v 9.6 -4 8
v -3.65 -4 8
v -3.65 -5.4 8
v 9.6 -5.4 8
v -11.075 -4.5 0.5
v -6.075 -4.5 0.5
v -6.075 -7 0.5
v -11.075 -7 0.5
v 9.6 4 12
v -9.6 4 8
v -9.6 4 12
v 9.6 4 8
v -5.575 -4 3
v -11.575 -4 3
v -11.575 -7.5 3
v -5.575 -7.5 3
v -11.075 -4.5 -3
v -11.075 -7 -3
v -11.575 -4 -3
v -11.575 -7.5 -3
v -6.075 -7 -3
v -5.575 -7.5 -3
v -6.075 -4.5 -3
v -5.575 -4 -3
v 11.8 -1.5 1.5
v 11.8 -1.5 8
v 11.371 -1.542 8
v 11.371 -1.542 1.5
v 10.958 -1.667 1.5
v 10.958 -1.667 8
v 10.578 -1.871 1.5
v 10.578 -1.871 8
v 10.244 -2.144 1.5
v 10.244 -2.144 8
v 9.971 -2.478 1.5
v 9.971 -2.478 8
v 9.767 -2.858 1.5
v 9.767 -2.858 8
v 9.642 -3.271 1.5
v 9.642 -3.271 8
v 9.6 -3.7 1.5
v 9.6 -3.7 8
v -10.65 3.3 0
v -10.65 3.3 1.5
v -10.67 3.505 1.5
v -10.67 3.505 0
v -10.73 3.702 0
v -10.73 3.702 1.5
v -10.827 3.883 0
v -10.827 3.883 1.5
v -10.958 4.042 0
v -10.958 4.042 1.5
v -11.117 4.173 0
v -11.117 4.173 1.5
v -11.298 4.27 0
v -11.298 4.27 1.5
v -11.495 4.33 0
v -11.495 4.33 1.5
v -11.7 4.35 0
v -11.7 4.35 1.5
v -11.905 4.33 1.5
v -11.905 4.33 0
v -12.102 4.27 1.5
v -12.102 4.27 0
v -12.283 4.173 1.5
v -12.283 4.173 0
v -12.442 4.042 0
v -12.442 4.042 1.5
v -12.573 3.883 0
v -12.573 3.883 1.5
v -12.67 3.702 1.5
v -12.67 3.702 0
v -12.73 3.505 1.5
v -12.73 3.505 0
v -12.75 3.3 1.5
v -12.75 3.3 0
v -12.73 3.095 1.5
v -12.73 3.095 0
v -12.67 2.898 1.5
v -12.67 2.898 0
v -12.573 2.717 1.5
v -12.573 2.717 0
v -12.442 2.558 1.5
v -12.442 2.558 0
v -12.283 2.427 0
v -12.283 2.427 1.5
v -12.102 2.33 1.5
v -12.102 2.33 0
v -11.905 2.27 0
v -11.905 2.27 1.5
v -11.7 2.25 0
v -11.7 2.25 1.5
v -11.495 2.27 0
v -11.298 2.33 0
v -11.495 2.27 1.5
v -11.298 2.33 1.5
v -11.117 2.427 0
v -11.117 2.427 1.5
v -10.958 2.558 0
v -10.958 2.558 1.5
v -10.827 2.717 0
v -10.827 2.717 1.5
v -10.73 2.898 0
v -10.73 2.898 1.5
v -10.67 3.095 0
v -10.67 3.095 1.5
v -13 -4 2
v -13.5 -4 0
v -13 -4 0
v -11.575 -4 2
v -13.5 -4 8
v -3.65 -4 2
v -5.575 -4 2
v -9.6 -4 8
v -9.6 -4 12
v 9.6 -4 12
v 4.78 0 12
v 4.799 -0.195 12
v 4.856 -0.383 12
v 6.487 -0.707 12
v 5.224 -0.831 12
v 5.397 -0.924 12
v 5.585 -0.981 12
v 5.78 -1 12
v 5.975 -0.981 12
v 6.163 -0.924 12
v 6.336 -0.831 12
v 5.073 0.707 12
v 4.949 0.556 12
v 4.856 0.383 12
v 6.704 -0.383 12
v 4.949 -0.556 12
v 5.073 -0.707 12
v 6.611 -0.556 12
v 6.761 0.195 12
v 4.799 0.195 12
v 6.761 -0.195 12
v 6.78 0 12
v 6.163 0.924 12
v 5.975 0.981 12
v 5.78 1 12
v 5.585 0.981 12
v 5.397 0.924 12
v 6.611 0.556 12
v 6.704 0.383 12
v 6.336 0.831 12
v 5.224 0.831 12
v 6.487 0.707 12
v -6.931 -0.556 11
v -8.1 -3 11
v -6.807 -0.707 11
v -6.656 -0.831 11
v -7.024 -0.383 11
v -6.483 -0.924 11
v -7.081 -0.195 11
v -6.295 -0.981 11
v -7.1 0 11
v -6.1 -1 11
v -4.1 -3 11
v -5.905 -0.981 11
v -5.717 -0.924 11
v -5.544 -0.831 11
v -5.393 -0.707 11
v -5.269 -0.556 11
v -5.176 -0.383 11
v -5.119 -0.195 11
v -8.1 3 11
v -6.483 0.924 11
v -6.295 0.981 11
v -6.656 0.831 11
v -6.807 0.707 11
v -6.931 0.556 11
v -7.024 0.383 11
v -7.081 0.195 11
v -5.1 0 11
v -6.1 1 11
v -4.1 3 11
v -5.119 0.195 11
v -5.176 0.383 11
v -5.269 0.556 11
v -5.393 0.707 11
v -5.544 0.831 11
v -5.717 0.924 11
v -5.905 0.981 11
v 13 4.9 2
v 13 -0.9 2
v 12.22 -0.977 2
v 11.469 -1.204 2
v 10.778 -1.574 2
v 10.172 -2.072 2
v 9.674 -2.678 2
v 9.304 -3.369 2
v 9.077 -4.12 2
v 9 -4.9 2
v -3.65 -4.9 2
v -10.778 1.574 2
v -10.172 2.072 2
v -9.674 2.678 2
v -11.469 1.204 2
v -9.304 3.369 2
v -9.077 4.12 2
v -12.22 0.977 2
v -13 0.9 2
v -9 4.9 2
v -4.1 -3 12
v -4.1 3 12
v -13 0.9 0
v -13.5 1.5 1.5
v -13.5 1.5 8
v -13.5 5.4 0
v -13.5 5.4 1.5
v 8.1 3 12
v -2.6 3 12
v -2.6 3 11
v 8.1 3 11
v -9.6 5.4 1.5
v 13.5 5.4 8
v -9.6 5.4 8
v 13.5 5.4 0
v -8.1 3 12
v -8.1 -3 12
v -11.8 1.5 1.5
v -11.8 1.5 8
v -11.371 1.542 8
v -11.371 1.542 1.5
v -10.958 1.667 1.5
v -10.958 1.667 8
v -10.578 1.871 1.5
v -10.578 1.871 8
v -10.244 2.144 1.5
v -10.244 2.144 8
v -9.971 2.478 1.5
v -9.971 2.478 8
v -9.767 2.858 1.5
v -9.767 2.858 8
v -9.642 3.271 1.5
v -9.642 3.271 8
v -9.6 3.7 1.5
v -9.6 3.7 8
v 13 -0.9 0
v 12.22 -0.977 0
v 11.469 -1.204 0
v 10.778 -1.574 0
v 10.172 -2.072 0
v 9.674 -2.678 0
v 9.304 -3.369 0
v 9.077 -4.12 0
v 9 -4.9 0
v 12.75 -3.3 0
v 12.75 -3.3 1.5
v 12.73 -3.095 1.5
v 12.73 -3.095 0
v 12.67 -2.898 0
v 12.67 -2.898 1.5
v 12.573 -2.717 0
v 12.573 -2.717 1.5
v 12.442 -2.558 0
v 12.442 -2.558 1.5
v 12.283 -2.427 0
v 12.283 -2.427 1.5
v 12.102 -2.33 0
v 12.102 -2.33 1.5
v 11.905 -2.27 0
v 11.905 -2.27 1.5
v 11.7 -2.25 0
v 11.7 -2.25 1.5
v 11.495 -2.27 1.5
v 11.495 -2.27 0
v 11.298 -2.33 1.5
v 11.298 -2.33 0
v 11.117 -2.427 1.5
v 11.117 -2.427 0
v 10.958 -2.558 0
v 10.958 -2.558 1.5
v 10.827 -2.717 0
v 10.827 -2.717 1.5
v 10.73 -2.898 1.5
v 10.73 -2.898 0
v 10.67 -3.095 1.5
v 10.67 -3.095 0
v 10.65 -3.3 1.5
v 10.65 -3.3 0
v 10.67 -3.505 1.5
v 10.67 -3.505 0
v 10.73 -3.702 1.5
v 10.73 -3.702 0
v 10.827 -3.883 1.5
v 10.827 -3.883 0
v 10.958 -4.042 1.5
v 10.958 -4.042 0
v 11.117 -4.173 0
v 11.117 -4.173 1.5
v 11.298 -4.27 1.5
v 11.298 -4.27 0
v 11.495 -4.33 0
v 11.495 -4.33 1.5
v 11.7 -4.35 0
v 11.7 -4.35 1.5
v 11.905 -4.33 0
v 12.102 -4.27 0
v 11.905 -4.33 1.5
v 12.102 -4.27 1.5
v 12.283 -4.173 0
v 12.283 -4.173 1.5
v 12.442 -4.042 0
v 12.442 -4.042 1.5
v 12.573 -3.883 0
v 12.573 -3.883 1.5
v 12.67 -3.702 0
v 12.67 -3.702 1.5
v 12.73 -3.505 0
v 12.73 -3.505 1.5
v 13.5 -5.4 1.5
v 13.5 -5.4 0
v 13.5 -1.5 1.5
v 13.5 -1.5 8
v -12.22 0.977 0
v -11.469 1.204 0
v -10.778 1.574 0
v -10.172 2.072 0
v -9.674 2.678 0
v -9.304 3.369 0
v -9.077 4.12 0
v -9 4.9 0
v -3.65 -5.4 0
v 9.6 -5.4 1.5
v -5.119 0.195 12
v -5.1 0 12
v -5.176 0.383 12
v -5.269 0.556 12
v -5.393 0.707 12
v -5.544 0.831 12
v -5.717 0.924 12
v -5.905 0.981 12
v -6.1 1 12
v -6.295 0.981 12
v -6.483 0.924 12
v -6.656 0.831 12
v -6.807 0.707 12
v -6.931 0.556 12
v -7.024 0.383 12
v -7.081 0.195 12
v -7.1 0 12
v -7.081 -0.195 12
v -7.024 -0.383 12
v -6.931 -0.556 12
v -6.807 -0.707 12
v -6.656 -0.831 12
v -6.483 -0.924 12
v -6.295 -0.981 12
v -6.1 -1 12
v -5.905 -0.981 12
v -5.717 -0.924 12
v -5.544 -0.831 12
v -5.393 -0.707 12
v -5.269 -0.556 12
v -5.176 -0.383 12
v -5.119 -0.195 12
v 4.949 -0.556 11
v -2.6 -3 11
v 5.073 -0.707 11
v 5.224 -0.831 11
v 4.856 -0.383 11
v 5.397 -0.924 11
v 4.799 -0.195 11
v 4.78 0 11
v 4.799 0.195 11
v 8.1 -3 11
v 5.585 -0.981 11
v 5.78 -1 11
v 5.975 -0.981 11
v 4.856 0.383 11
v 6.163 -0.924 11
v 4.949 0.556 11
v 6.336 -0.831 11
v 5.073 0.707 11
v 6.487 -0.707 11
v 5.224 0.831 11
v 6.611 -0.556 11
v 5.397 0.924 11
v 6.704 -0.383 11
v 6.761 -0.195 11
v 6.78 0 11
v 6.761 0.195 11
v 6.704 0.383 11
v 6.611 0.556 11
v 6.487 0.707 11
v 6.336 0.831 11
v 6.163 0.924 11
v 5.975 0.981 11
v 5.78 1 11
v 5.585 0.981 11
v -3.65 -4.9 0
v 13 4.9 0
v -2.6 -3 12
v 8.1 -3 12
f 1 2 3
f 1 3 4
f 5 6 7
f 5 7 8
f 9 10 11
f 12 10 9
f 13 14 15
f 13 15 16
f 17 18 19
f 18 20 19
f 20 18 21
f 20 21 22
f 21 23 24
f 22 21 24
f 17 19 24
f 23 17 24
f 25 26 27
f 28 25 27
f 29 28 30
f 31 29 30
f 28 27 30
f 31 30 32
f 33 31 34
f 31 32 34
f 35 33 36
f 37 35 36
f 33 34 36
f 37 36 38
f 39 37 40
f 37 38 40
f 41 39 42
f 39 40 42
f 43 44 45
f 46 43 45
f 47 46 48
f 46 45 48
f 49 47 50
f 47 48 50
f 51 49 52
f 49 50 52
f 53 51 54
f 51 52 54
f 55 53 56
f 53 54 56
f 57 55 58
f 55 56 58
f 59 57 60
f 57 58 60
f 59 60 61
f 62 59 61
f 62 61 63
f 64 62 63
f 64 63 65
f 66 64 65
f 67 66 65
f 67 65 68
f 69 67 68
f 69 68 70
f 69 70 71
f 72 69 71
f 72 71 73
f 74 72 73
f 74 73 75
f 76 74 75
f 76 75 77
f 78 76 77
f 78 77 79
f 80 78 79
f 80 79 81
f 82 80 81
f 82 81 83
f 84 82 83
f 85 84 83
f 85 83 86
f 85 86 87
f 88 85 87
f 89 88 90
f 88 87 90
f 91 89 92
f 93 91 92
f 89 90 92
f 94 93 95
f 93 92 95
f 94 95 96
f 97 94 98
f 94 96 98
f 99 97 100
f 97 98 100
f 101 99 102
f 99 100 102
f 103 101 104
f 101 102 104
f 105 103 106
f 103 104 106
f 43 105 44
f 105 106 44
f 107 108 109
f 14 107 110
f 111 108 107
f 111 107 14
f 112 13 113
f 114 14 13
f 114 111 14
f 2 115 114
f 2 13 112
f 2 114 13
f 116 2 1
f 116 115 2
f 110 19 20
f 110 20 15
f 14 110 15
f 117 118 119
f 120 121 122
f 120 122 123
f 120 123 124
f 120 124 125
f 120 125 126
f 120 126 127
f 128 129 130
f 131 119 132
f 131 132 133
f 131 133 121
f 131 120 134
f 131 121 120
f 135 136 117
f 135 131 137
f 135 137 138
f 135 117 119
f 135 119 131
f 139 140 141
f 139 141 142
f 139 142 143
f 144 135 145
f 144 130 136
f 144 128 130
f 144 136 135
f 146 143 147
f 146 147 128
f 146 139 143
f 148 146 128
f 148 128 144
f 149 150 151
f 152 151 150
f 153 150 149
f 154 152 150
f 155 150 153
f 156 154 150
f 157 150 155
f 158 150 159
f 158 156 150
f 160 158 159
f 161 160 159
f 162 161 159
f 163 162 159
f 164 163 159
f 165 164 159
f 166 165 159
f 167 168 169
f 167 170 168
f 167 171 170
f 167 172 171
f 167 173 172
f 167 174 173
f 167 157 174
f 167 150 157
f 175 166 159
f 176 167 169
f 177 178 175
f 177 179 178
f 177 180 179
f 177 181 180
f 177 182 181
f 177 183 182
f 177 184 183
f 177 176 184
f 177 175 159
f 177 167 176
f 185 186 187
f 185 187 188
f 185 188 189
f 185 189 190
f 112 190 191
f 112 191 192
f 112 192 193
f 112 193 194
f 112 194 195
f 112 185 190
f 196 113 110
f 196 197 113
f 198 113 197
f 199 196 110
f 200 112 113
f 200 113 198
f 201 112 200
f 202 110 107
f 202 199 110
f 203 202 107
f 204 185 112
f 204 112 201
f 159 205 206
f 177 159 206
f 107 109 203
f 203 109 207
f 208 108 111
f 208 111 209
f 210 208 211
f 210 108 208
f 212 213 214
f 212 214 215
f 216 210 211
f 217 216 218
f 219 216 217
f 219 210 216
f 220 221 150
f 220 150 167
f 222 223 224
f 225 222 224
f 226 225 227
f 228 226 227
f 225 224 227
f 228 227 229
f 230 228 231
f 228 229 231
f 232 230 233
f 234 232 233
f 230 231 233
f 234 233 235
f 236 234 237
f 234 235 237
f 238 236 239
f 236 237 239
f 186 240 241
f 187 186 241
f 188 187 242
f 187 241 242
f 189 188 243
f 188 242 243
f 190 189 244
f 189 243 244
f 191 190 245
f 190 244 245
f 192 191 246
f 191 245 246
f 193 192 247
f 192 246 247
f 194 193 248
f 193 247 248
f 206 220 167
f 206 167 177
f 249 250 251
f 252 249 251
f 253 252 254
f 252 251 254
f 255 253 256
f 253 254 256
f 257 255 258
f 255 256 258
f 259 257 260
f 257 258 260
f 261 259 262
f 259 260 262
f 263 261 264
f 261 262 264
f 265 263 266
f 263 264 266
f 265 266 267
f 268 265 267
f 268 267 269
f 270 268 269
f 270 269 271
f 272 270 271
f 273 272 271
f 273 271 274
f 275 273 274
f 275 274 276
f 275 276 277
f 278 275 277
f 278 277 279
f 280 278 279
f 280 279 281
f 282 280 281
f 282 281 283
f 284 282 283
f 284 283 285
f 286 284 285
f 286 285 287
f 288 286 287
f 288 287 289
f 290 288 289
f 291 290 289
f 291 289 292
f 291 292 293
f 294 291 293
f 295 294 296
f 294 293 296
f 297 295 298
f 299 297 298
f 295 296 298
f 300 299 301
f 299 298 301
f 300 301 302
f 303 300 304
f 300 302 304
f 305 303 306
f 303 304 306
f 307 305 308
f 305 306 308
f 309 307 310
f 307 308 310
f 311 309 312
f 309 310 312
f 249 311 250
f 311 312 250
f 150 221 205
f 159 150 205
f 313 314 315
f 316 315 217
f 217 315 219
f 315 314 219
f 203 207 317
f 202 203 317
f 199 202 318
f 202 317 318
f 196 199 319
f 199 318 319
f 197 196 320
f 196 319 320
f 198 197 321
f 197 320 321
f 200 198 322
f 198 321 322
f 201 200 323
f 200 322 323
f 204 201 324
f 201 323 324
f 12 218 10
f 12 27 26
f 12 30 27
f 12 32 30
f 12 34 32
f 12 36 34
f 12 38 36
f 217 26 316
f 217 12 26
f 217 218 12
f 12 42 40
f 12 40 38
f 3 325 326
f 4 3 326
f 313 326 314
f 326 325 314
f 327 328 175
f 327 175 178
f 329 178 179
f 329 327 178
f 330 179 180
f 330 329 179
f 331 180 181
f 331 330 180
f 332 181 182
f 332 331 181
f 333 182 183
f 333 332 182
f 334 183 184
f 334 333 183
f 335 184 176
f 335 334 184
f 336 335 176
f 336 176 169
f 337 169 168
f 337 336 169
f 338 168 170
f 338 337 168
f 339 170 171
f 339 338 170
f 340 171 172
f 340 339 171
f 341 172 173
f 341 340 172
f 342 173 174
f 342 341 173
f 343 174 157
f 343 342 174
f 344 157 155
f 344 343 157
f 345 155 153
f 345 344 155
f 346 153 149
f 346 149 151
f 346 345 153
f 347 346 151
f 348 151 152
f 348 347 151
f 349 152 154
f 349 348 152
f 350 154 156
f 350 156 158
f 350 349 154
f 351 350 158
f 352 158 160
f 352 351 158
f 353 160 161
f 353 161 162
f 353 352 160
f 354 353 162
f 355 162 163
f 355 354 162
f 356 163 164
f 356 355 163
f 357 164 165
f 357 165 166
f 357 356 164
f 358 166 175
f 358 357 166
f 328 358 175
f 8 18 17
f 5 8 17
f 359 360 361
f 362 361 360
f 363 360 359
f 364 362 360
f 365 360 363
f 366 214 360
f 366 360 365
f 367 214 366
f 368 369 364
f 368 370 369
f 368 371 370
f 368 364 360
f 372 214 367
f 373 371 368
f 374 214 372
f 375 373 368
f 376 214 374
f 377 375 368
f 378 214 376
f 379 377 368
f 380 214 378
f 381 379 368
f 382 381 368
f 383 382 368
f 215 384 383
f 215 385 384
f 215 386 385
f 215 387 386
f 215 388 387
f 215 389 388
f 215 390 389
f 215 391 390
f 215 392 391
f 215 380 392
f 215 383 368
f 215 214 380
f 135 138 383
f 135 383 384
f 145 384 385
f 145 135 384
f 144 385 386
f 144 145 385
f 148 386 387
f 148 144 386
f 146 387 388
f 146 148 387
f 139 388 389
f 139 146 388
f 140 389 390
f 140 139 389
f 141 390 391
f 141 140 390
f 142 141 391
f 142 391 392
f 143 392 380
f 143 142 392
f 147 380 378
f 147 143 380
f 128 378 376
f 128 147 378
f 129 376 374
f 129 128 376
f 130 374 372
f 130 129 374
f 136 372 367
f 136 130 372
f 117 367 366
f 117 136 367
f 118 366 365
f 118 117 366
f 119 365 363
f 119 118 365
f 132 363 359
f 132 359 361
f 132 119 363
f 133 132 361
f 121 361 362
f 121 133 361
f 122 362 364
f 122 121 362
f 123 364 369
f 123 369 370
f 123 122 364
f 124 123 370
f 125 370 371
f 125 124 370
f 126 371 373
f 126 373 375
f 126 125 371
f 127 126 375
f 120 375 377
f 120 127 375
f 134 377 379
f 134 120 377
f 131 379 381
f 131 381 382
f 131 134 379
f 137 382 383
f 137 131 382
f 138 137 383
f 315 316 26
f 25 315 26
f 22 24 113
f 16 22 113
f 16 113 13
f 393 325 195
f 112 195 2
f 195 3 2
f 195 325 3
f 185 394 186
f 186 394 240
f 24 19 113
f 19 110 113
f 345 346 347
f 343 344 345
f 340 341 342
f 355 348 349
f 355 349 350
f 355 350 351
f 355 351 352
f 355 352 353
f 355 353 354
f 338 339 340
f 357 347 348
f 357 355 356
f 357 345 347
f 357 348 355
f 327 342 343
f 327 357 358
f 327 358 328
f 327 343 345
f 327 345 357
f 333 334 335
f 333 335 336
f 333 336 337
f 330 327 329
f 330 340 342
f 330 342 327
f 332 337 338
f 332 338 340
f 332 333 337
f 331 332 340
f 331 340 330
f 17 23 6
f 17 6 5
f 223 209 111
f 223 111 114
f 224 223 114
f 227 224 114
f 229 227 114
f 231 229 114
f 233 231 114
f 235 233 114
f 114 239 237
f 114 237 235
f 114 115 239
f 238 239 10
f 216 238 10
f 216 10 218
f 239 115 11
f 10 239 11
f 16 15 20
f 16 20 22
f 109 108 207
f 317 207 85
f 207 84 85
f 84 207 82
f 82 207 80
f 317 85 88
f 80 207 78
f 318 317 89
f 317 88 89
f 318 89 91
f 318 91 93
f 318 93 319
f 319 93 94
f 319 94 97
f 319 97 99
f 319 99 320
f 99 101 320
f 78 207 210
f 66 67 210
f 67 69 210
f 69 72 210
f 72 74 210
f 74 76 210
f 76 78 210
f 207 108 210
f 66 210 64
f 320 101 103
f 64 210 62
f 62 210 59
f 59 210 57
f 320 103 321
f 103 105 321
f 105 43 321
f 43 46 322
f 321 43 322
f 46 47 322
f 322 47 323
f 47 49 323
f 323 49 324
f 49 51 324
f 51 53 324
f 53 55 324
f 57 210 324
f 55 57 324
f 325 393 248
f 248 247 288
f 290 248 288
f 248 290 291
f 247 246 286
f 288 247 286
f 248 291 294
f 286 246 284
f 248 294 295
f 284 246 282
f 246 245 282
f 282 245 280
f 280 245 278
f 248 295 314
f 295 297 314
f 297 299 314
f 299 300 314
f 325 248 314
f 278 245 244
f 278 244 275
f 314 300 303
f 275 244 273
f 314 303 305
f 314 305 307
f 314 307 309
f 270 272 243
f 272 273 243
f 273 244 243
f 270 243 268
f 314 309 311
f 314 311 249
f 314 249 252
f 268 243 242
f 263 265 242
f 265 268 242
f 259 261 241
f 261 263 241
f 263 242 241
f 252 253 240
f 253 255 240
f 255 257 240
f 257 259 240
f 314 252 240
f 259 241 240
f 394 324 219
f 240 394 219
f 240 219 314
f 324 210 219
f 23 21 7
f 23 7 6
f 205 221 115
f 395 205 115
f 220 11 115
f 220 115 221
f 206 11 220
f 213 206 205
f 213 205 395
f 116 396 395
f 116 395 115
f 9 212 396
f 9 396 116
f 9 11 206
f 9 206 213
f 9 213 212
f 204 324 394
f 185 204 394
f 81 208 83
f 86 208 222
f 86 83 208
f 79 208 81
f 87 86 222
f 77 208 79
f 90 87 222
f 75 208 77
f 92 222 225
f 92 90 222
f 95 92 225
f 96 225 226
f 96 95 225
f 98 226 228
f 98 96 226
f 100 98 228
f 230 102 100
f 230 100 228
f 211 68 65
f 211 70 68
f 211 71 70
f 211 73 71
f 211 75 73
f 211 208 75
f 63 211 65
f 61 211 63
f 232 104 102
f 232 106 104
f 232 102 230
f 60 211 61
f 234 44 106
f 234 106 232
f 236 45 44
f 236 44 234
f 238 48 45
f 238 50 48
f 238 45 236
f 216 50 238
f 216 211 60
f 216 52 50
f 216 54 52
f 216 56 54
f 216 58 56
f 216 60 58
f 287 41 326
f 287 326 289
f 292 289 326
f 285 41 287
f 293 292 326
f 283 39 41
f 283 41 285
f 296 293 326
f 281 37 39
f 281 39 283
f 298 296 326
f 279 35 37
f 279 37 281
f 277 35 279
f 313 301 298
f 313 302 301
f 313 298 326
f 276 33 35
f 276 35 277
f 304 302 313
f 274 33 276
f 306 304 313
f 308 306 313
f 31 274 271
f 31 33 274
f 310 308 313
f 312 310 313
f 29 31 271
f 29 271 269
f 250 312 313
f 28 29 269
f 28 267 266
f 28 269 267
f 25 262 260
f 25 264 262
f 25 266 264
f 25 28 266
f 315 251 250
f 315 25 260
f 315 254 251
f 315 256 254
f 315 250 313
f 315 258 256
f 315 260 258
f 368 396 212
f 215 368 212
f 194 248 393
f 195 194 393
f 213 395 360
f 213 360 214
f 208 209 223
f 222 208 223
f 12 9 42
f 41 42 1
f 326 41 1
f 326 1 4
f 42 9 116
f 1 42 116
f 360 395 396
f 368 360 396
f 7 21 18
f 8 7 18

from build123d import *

# Parameters (mm, degrees)
ESQUISSE1_W             = 27
ESQUISSE1_H             = 10.8
BOSS_EXTRU_1_DEPTH      = 8
ESQUISSE2_R             = 1.05
ENL_V_MAT_EXTRU_1_DEPTH = 17.595481313
ESQUISSE3_W             = 19.2
ESQUISSE3_H             = 8
BOSS_EXTRU_2_DEPTH      = 4
ENL_V_MAT_EXTRU_2_DEPTH = 6.5
ESQUISSE5_W             = 4
ESQUISSE5_H             = 6
ESQUISSE5_R             = 1
ESQUISSE5_W_2           = 10.7
ENL_V_MAT_EXTRU_3_DEPTH = 1
ESQUISSE6_W             = 9.85
ESQUISSE6_H             = 1.4
ENL_V_MAT_EXTRU_4_DEPTH = 17.595481313
ESQUISSE7_W             = 6
ESQUISSE7_H             = 6
BOSS_EXTRU_3_DEPTH      = 3.5
ESQUISSE8_W             = 5
ESQUISSE8_H             = 2.5
ENL_V_MAT_EXTRU_5_DEPTH = 3.5
ENL_V_MAT_EXTRU_6_DEPTH = 2


with BuildPart() as part:
    # Esquisse1 → Boss.-Extru.1 (new body)
    with BuildSketch(Plane.XY):
        Rectangle(ESQUISSE1_W, ESQUISSE1_H)
    extrude(amount=BOSS_EXTRU_1_DEPTH)

    # Esquisse2 → Enlèv. mat.-Extru.1 (cut, through all)
    with BuildSketch(Plane.XY.offset(8)):
        with Locations((-11.7, 3.3)):
            Circle(ESQUISSE2_R)
        with Locations((11.7, -3.3)):
            Circle(ESQUISSE2_R)
    extrude(amount=-ENL_V_MAT_EXTRU_1_DEPTH, mode=Mode.SUBTRACT)

    # Esquisse3 → Boss.-Extru.2 (add)
    with BuildSketch(Plane.XY.offset(8)):
        Rectangle(ESQUISSE3_W, ESQUISSE3_H)
    extrude(amount=BOSS_EXTRU_2_DEPTH)

    # Esquisse4 → Enlèv. mat.-Extru.2 (cut)
    with BuildSketch(Plane.XY.offset(8)):
        with BuildLine():
            Line((-9.6, 3.7), (-9.6, 5.4))
            Line((-9.6, 5.4), (-13.5, 5.4))
            Line((-13.5, 5.4), (-13.5, 1.5))
            Line((-13.5, 1.5), (-11.8, 1.5))
            ThreePointArc((-11.8, 1.5), (-10.244365081, 2.144365081), (-9.6, 3.7))
        make_face()
        with BuildLine():
            Line((9.6, -5.4), (13.5, -5.4))
            Line((13.5, -5.4), (13.5, -1.5))
            Line((13.5, -1.5), (11.8, -1.5))
            ThreePointArc((11.8, -1.5), (10.244365081, -2.144365081), (9.6, -3.7))
            Line((9.6, -3.7), (9.6, -5.4))
        make_face()
    extrude(amount=-ENL_V_MAT_EXTRU_2_DEPTH, mode=Mode.SUBTRACT)

    # Esquisse5 → Enlèv. mat.-Extru.3 (cut)
    # profile 1 of 2: a face of its own
    with BuildSketch(Plane.XY.offset(12)):
        with Locations((-6.1, 0)):
            Rectangle(ESQUISSE5_W, ESQUISSE5_H)
        with Locations((-6.1, 0)):
            Circle(ESQUISSE5_R, mode=Mode.SUBTRACT)
    # profile 2 of 2: a face of its own
    with BuildSketch(Plane.XY.offset(12)):
        with Locations((2.75, 0)):
            Rectangle(ESQUISSE5_W_2, ESQUISSE5_H)
        with Locations((5.78, 0)):
            Circle(ESQUISSE5_R, mode=Mode.SUBTRACT)
    extrude(amount=-ENL_V_MAT_EXTRU_3_DEPTH, mode=Mode.SUBTRACT)

    # Esquisse6 → Enlèv. mat.-Extru.4 (cut, through all)
    with BuildSketch(Plane.XY.offset(8)):
        with Locations((-8.575, -4.7)):
            Rectangle(ESQUISSE6_W, ESQUISSE6_H)
    extrude(amount=-ENL_V_MAT_EXTRU_4_DEPTH, mode=Mode.SUBTRACT)

    # Esquisse7 → Boss.-Extru.3 (add)
    with BuildSketch(Plane.XZ.offset(4)):
        with Locations((-8.575, 0)):
            Rectangle(ESQUISSE7_W, ESQUISSE7_H)
    extrude(amount=BOSS_EXTRU_3_DEPTH)

    # Esquisse8 → Enlèv. mat.-Extru.5 (cut)
    with BuildSketch(Plane(origin=(0, 0, -3), x_dir=(-1, 0, 0), z_dir=(0, 0, -1))):
        with Locations((8.575, -5.75)):
            Rectangle(ESQUISSE8_W, ESQUISSE8_H)
    extrude(amount=-ENL_V_MAT_EXTRU_5_DEPTH, mode=Mode.SUBTRACT)

    # Esquisse9 → Enlèv. mat.-Extru.6 (cut)
    with BuildSketch(Plane(origin=(0, 0, 0), x_dir=(-1, 0, 0), z_dir=(0, 0, -1))):
        with BuildLine():
            Line((9, 4.9), (-13, 4.9))
            Line((-13, 4.9), (-13, -0.9))
            ThreePointArc((-13, -0.9), (-10.171572875, -2.071572875), (-9, -4.9))
            Line((-9, -4.9), (3.65, -4.9))
            Line((3.65, -4.9), (3.65, -4))
            Line((3.65, -4), (13, -4))
            Line((13, -4), (13, 0.9))
            ThreePointArc((13, 0.9), (10.171572875, 2.071572875), (9, 4.9))
        make_face()
    extrude(amount=-ENL_V_MAT_EXTRU_6_DEPTH, mode=Mode.SUBTRACT)


solid = part.part
